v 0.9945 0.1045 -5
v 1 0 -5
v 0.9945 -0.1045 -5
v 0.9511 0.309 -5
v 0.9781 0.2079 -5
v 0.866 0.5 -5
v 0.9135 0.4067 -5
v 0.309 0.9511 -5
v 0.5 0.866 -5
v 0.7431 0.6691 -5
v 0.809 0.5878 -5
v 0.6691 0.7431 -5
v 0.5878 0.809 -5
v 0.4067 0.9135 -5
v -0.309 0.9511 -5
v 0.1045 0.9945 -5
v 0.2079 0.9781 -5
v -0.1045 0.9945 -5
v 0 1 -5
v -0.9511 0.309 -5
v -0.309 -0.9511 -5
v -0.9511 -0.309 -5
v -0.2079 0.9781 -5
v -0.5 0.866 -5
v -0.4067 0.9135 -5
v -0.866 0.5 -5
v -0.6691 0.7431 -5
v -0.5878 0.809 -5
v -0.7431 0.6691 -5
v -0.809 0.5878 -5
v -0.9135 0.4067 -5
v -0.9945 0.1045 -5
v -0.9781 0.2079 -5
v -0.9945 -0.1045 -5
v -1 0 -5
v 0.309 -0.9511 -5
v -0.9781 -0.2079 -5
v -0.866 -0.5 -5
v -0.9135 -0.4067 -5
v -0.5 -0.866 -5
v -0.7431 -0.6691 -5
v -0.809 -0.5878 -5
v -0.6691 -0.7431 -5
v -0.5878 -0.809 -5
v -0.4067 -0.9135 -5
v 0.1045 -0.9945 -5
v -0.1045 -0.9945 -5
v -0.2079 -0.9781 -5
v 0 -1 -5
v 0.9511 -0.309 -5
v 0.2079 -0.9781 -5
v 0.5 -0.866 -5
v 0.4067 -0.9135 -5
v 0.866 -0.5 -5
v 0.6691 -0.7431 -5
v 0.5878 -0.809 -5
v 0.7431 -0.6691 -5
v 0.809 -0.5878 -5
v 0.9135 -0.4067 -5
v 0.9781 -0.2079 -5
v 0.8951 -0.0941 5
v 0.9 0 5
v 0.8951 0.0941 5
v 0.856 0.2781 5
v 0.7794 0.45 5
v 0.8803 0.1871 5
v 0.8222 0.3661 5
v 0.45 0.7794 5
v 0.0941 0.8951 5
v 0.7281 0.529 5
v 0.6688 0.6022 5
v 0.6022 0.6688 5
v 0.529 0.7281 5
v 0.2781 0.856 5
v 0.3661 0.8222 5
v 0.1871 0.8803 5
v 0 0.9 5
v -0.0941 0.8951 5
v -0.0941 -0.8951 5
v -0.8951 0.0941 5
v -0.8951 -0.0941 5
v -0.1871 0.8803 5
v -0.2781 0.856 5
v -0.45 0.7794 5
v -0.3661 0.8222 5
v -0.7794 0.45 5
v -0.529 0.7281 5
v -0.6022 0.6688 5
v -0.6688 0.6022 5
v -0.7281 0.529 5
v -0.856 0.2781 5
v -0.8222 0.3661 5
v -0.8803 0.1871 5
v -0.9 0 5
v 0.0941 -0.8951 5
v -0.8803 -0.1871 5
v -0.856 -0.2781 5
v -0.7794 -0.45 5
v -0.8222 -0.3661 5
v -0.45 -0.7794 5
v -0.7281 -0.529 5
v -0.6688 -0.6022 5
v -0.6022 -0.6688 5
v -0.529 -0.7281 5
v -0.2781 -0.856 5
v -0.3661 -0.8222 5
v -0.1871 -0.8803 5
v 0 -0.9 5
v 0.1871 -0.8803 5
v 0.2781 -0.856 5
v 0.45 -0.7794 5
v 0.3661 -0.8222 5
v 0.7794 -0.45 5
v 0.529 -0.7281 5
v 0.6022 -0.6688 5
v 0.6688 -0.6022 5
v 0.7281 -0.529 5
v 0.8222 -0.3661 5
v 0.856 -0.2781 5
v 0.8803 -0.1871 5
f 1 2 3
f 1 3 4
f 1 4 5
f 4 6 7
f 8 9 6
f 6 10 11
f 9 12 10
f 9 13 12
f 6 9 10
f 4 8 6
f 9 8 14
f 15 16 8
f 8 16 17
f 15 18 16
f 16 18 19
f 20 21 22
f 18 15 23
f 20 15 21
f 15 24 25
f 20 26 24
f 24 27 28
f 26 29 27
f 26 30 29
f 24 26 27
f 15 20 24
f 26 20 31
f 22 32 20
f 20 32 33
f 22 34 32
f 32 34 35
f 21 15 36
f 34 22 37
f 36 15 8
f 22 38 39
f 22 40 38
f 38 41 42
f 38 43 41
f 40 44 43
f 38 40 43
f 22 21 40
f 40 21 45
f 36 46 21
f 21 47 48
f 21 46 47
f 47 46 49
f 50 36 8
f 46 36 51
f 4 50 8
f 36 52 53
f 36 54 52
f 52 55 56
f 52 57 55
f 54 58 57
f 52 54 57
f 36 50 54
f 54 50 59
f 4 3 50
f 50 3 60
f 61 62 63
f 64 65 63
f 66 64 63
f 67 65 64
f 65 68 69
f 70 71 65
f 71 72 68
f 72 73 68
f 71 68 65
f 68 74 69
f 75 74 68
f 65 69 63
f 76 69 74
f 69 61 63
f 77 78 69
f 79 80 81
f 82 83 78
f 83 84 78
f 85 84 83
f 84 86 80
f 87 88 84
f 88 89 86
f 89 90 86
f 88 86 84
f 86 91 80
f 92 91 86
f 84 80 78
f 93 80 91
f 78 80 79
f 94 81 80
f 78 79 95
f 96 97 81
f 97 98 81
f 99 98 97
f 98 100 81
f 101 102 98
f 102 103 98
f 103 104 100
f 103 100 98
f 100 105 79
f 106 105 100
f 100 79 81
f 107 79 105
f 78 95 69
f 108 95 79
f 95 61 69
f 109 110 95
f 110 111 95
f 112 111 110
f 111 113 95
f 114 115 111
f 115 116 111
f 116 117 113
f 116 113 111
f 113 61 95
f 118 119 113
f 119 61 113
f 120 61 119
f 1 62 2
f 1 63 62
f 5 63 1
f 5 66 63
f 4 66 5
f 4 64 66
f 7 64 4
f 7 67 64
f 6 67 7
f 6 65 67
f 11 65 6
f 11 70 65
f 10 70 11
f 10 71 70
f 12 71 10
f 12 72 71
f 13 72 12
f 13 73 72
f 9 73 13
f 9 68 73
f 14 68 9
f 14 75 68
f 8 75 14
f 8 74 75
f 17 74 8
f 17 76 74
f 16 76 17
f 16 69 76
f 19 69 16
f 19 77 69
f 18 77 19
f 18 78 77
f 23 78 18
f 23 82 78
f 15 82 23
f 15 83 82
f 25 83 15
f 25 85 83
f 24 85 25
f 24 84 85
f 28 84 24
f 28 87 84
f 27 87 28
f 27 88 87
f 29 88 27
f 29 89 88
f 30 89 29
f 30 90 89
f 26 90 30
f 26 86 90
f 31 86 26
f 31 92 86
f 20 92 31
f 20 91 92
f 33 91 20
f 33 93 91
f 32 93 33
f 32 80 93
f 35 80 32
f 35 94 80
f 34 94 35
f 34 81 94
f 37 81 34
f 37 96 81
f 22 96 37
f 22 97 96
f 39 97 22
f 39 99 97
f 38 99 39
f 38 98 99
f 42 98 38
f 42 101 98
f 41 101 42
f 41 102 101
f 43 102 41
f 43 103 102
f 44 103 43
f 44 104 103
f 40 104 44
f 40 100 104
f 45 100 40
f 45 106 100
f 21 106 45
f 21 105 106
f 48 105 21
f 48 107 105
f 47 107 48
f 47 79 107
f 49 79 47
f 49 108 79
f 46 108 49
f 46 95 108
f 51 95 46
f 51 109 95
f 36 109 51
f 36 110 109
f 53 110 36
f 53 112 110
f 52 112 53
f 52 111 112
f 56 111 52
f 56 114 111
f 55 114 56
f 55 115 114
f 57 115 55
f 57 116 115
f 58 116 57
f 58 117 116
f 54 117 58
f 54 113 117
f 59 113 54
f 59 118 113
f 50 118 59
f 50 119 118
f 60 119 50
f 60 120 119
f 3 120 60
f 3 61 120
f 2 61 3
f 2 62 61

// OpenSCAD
//cylinder(r=0.9, h=5, $fn=60);

linear_extrude(height = 10, center = true, convexity = 10, scale=[0.9, 0.9], $fn=60)
        circle(r = 1.0);
